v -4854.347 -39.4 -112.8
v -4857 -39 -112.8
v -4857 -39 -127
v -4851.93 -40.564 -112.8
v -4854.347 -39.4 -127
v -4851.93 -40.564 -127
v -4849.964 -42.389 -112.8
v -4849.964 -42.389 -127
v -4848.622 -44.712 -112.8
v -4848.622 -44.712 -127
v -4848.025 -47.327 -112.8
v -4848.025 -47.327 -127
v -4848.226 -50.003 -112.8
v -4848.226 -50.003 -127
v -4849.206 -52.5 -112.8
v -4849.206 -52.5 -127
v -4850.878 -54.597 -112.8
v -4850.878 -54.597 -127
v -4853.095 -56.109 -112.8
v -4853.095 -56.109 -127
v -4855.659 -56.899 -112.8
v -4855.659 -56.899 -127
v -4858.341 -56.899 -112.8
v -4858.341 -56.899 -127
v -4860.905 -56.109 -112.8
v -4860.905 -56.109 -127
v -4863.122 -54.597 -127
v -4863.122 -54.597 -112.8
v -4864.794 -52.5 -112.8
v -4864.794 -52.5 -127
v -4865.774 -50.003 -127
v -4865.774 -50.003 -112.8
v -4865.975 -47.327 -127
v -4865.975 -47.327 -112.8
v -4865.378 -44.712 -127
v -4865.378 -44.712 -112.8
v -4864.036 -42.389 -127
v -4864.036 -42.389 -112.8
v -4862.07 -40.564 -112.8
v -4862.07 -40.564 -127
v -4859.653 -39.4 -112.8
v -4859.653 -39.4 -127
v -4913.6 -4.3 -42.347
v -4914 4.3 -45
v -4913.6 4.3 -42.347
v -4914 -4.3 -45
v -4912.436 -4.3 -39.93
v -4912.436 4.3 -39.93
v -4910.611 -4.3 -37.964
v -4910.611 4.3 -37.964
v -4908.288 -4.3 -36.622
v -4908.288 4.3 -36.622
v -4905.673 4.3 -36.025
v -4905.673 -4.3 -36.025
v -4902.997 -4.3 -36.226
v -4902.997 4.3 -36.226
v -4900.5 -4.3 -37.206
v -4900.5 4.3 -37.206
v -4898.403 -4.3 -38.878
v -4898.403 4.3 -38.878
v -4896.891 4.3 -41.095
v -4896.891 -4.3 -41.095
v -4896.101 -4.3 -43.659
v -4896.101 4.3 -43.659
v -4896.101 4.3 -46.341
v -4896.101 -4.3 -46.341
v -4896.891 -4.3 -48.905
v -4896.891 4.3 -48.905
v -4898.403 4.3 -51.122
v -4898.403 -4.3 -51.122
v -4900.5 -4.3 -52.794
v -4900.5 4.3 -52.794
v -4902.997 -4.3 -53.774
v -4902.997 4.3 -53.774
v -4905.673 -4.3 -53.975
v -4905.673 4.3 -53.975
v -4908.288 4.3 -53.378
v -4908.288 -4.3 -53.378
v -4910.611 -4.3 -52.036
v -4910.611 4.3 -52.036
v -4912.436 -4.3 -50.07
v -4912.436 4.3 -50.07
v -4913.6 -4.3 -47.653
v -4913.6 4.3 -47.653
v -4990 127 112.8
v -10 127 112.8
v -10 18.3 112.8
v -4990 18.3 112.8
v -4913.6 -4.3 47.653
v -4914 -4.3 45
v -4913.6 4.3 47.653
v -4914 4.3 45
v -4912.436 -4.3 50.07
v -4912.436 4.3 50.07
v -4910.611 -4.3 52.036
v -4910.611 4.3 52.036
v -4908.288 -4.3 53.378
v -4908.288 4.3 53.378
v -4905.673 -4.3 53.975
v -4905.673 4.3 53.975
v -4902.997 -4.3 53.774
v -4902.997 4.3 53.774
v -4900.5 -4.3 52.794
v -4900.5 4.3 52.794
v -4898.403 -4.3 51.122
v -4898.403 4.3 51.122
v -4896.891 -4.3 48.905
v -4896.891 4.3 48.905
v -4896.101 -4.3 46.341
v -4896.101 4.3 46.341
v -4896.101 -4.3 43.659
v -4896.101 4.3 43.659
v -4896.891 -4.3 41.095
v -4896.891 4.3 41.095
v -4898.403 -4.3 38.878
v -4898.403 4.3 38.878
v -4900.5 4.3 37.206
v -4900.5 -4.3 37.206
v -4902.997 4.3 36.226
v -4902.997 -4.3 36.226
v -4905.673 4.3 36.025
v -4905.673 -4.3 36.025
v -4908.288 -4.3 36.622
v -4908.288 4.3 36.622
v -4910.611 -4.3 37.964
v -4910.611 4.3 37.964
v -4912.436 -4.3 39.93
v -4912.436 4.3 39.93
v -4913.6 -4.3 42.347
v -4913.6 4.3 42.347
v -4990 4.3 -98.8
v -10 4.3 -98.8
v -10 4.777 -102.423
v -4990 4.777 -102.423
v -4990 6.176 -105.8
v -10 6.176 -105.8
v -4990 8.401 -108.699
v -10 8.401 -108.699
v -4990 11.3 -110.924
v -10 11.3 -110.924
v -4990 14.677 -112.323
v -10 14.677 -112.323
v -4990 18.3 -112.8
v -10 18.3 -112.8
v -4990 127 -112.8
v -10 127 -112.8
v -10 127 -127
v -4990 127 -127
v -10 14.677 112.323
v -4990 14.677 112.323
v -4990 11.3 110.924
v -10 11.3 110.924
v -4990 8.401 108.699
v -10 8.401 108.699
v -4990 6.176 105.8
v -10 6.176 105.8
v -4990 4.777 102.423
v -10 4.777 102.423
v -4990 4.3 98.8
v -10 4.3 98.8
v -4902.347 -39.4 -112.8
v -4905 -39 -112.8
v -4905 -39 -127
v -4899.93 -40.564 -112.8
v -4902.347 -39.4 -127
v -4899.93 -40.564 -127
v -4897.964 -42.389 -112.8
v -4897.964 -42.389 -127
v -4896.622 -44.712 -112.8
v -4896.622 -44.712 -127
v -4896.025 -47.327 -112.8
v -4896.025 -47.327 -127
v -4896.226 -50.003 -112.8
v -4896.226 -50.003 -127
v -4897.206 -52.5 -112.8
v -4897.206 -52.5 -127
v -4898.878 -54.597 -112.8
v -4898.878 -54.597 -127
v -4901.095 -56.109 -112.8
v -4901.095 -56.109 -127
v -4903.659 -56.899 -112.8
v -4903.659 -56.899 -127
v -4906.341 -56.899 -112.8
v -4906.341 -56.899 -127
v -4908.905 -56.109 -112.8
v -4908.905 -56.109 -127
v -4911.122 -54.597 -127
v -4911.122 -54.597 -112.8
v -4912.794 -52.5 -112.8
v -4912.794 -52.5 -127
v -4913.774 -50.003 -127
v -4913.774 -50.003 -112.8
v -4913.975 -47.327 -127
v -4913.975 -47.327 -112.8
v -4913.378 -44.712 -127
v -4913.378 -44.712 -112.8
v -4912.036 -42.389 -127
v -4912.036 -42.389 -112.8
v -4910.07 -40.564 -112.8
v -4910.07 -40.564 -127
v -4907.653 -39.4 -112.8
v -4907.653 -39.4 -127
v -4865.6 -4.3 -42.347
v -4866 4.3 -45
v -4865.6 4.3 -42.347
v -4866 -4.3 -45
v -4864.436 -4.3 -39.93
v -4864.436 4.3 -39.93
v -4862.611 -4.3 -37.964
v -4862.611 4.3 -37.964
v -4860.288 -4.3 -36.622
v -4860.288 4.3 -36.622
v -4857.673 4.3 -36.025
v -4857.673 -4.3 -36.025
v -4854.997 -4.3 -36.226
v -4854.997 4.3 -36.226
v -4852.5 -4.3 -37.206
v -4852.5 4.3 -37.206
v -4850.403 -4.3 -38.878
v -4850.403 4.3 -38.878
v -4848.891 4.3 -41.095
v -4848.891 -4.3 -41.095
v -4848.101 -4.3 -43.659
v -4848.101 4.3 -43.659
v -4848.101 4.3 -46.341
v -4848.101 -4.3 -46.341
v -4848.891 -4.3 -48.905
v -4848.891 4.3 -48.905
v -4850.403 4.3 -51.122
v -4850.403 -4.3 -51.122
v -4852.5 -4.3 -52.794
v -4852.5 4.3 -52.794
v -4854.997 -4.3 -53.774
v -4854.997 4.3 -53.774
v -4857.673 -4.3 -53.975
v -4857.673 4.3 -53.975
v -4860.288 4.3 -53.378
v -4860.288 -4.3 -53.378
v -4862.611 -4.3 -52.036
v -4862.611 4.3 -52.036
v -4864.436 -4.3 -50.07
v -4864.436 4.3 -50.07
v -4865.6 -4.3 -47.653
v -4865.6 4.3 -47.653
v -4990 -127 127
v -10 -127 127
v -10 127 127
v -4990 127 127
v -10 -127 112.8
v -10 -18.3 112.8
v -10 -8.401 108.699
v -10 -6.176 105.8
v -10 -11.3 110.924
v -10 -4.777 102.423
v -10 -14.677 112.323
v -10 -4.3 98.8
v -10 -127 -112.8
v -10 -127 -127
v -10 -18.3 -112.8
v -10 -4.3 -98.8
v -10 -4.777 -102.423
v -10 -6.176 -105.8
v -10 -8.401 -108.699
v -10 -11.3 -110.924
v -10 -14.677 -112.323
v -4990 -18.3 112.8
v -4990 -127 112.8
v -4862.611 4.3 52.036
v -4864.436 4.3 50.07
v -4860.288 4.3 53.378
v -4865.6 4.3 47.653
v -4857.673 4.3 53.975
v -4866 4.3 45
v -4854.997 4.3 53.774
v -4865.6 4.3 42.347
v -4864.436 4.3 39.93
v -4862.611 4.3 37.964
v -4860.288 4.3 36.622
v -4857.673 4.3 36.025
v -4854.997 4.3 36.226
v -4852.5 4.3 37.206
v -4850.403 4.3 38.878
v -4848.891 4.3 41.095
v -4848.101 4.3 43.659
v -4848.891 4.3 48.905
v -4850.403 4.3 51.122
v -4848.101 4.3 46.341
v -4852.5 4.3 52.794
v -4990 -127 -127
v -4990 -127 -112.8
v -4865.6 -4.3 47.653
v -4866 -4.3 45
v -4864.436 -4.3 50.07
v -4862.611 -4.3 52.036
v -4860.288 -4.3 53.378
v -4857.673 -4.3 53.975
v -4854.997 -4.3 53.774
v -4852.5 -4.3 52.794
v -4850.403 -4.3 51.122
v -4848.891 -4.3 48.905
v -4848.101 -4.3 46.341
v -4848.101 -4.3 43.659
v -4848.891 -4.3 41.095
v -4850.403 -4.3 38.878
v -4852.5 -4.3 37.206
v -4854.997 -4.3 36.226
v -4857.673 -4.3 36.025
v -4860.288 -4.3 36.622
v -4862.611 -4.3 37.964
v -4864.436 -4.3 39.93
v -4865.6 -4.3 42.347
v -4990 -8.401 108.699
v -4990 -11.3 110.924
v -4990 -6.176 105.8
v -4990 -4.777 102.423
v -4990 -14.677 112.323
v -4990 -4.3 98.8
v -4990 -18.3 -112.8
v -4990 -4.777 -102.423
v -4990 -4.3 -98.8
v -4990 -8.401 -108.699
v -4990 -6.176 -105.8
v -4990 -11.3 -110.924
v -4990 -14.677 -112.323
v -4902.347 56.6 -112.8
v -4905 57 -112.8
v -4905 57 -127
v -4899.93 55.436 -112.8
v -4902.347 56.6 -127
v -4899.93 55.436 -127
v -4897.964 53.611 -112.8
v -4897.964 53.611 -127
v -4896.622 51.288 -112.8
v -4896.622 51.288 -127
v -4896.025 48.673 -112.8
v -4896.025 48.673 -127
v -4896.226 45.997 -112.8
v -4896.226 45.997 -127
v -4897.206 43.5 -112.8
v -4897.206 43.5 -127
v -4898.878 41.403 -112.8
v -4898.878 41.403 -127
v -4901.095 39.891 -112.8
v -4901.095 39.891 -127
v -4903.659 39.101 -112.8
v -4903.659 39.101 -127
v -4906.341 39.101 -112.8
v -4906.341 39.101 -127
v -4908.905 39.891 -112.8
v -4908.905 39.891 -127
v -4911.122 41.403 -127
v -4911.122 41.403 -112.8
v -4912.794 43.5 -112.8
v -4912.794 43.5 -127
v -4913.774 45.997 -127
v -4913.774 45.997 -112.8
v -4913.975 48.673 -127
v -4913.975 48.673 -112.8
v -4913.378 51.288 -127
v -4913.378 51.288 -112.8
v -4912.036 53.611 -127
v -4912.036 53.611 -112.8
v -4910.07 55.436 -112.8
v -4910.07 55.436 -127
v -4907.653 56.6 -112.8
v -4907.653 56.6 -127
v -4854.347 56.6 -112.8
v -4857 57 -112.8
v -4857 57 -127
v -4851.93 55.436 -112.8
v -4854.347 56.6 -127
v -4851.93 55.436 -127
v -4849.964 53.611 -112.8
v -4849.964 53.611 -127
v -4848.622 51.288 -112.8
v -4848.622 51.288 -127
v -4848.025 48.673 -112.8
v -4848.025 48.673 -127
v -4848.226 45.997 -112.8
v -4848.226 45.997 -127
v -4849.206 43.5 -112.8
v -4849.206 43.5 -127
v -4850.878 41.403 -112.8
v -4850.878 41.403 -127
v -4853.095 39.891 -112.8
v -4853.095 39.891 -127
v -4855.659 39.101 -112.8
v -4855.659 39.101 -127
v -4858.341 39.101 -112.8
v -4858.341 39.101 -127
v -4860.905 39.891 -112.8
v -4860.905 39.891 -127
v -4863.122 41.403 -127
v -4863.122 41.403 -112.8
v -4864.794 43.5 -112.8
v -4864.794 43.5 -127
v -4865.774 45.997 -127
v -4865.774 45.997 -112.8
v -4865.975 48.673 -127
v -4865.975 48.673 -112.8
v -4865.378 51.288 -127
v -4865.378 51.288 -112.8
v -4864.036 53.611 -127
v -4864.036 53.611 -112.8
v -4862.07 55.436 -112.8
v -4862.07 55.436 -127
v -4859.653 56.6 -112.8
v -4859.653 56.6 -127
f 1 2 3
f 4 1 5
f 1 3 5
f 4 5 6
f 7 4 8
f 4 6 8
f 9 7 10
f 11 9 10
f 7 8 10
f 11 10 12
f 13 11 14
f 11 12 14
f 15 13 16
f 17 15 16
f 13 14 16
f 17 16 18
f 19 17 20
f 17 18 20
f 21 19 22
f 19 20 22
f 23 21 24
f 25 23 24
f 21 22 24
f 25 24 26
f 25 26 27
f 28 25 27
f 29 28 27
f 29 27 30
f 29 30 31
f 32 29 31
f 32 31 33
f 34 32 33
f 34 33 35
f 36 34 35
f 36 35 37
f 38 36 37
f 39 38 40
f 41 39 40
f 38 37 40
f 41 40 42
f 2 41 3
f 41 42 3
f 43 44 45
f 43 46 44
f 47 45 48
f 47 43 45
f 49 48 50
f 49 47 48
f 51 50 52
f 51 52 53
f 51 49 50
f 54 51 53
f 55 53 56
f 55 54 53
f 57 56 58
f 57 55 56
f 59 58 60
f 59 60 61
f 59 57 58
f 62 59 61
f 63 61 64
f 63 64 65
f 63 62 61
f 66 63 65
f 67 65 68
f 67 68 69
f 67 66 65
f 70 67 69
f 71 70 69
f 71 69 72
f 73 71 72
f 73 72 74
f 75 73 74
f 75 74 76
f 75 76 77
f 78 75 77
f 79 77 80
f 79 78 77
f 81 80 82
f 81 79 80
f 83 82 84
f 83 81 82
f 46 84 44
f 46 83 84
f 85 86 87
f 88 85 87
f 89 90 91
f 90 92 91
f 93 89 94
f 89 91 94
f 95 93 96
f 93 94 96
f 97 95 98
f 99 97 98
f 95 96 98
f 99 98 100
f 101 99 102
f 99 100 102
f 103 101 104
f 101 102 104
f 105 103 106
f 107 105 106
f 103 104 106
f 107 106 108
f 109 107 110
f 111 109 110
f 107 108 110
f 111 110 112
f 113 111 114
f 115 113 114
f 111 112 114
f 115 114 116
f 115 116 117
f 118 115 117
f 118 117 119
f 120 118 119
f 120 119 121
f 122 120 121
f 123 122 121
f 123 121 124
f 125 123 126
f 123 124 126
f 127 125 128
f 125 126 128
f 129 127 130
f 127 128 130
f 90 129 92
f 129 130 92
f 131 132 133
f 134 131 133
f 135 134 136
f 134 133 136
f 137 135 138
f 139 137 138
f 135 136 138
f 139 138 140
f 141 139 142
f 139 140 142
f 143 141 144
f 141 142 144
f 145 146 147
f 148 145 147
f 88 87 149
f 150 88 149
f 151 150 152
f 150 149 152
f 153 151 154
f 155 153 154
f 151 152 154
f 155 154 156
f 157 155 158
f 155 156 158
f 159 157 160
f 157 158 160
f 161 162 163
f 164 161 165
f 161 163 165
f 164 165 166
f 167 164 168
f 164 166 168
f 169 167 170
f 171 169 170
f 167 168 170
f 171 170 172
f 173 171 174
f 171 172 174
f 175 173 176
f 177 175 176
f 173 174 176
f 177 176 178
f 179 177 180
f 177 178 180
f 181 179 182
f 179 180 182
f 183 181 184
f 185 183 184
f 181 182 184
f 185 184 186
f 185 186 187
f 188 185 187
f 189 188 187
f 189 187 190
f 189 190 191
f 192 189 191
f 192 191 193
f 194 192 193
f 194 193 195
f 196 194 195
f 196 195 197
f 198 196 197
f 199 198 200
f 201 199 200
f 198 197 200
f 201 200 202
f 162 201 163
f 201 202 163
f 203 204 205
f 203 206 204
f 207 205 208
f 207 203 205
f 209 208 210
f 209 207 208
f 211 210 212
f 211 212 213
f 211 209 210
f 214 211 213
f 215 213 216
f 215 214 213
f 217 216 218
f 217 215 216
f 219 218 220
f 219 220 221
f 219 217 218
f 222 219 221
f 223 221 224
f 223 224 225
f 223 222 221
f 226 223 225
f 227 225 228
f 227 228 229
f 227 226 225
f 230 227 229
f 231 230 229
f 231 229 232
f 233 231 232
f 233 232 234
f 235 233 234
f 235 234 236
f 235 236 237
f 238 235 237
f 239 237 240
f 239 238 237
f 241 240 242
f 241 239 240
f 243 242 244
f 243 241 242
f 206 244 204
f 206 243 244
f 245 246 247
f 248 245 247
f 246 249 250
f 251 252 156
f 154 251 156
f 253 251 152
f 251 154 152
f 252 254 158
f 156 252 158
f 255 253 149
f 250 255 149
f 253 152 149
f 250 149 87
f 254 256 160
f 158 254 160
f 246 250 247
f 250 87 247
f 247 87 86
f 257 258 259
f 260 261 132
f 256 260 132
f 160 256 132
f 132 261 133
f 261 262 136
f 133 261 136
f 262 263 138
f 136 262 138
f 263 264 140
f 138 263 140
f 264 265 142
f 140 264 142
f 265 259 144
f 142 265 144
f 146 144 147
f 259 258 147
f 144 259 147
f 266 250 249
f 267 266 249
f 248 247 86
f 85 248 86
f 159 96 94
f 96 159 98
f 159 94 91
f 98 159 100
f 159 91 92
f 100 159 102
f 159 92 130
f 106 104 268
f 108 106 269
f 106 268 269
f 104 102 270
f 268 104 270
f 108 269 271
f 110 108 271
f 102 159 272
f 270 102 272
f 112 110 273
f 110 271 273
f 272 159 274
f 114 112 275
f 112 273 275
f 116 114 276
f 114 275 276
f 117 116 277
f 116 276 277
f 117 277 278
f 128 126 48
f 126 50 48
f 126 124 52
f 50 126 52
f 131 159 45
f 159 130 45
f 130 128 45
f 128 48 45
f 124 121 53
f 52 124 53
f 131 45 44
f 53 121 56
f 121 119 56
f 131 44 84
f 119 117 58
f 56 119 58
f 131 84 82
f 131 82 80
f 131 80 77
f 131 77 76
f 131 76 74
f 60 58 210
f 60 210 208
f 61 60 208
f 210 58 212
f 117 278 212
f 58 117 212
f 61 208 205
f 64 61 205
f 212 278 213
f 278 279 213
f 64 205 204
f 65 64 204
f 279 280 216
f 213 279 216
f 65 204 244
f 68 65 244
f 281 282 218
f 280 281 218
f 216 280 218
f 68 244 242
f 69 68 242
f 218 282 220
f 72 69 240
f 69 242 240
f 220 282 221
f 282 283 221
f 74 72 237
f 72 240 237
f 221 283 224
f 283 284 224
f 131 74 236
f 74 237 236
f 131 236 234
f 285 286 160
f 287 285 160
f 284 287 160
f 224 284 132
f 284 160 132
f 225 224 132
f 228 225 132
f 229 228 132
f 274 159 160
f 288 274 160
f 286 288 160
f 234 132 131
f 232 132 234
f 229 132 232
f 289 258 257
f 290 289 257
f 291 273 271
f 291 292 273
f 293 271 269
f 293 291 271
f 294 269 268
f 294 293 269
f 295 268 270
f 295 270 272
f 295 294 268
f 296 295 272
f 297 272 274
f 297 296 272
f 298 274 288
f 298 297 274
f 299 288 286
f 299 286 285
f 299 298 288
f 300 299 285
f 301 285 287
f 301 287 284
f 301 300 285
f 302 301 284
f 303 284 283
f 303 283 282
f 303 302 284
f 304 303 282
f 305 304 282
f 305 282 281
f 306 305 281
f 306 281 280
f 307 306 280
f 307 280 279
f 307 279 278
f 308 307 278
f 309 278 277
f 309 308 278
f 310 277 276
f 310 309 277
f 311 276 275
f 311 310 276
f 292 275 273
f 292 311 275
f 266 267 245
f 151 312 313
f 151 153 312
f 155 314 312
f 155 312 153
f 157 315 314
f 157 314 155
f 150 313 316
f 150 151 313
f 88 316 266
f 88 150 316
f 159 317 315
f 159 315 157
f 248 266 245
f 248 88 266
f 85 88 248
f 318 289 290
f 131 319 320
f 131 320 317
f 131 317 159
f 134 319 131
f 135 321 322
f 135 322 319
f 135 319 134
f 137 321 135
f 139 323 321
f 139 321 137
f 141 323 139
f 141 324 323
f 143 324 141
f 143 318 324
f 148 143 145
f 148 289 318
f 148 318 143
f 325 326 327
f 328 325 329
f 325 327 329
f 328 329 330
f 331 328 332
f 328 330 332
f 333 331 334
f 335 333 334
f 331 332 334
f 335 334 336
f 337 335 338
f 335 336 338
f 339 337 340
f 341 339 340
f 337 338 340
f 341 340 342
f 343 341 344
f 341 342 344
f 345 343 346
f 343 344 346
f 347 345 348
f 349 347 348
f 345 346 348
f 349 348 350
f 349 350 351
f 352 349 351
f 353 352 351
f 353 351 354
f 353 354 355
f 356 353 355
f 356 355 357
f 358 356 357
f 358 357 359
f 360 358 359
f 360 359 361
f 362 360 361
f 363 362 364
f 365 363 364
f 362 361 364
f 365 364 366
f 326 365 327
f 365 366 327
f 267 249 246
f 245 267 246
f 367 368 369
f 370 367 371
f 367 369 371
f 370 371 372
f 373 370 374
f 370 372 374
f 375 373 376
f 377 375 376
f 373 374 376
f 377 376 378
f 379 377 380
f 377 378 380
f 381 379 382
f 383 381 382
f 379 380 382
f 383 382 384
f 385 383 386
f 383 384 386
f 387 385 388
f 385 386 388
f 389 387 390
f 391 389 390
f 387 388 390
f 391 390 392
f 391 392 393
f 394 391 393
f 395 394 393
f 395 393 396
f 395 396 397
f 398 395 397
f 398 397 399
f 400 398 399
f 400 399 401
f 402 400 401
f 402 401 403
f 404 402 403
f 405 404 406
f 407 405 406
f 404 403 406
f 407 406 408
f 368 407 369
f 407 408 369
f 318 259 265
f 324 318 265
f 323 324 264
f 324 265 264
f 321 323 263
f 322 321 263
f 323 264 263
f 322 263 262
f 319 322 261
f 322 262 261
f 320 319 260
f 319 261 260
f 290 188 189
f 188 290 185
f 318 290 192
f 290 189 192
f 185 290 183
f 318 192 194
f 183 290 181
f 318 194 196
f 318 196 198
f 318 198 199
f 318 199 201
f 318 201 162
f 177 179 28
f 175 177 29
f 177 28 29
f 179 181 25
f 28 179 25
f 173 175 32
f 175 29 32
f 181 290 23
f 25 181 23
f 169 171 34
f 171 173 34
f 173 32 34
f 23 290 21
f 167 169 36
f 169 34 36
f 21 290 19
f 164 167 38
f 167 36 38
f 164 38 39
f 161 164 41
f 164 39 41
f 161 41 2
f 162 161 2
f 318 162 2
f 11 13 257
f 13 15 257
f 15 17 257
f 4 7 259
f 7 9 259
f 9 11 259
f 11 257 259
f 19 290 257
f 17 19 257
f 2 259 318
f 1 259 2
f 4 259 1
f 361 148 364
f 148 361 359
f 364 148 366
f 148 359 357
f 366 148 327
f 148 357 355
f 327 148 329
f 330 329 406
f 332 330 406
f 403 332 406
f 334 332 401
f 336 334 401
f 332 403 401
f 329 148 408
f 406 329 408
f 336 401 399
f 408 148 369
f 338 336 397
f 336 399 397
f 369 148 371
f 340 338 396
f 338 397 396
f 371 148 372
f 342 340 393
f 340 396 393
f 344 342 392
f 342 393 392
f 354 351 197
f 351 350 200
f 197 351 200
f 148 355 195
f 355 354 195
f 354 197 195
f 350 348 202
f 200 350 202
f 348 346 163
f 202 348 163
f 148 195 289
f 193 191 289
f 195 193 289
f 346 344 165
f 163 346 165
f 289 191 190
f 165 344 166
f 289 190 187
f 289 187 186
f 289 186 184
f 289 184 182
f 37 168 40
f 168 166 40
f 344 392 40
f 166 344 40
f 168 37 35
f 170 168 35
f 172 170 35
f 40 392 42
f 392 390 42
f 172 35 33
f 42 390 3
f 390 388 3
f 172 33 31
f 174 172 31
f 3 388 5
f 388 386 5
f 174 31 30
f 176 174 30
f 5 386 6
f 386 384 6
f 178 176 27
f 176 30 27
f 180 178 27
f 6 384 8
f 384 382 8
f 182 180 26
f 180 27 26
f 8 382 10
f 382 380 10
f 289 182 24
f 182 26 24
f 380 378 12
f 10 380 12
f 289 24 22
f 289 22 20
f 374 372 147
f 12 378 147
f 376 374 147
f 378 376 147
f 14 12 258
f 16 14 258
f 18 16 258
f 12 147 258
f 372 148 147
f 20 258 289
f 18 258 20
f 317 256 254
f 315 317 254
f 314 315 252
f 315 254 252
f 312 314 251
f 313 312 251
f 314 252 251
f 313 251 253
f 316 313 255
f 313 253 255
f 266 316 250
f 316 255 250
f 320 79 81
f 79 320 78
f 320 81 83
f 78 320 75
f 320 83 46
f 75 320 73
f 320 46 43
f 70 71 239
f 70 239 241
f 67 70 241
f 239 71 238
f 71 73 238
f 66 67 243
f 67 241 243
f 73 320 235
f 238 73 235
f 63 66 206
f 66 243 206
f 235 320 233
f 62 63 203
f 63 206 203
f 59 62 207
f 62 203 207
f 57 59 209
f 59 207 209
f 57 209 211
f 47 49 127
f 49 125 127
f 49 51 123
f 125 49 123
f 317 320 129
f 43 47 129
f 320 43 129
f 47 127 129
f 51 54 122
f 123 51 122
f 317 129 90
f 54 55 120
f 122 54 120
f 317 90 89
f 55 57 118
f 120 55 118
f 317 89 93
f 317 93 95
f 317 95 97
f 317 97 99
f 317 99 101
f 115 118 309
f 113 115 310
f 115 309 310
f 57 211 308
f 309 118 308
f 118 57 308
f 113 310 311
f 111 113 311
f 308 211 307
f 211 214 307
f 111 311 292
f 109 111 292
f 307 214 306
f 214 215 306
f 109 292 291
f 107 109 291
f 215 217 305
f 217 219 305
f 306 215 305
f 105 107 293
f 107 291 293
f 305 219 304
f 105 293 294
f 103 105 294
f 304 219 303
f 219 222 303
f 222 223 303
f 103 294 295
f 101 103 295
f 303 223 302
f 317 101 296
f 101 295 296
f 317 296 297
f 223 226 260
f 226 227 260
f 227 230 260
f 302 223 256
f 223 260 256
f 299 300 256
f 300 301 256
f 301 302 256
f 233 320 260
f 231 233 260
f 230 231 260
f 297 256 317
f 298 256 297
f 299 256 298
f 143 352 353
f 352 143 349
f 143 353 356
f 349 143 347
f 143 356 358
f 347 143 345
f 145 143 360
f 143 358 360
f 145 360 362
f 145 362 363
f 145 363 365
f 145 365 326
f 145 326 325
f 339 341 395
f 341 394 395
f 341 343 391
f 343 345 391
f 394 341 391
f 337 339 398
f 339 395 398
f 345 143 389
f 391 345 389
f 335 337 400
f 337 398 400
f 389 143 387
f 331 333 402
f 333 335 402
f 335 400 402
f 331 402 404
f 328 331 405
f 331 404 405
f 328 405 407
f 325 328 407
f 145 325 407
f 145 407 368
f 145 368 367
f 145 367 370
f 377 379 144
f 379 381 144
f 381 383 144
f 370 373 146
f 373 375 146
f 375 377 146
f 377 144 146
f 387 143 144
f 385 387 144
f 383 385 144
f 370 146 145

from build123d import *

# Parameters (mm, degrees)
UNIVERSAL_COLUMN_ICS_250UC72_9_1_DEPTH = 5000
SKETCH3_R                              = 9
CUT_EXTRUDE2_DEPTH                     = 14.2
SKETCH20_R                             = 9
CUT_EXTRUDE19_DEPTH                    = 4.3
SKETCH21_W                             = 254
SKETCH21_H                             = 254
CUT_EXTRUDE20_DEPTH                    = 10
SKETCH22_W                             = 282
SKETCH22_H                             = 282
CUT_EXTRUDE21_DEPTH                    = 10


with BuildPart() as part:
    # Sketch1 → Universal Column_ics 250UC72.9(1) (new body)
    with BuildSketch(Plane(origin=(0, 0, 0), x_dir=(0, 1, 0), z_dir=(-1, 0, 0))):
        with BuildLine():
            Line((-127, -127), (127, -127))
            Line((127, -127), (127, -112.8))
            Line((127, -112.8), (18.3, -112.8))
            ThreePointArc((18.3, -112.8), (8.400505063, -108.699494937), (4.3, -98.8))
            Line((4.3, -98.8), (4.3, 98.8))
            ThreePointArc((4.3, 98.8), (8.400505063, 108.699494937), (18.3, 112.8))
            Line((18.3, 112.8), (127, 112.8))
            Line((127, 112.8), (127, 127))
            Line((127, 127), (-127, 127))
            Line((-127, 127), (-127, 112.8))
            Line((-127, 112.8), (-18.3, 112.8))
            ThreePointArc((-18.3, 112.8), (-8.400505063, 108.699494937), (-4.3, 98.8))
            Line((-4.3, 98.8), (-4.3, -98.8))
            ThreePointArc((-4.3, -98.8), (-8.400505063, -108.699494937), (-18.3, -112.8))
            Line((-18.3, -112.8), (-127, -112.8))
            Line((-127, -112.8), (-127, -127))
        make_face()
    extrude(amount=UNIVERSAL_COLUMN_ICS_250UC72_9_1_DEPTH)

    # Sketch3 → Cut-Extrude2 (cut)
    with BuildSketch(Plane(origin=(-4890.5, 0, -127), x_dir=(0, -1, 0), z_dir=(0, 0, -1))):
        with Locations(Location((48, -33.5, 0), (0, 0, 180))):
            Circle(SKETCH3_R)
        with Locations(Location((48, 14.5, 0), (0, 0, 180))):
            Circle(SKETCH3_R)
        with Locations(Location((-48, -33.5, 0), (0, 0, 180))):
            Circle(SKETCH3_R)
        with Locations(Location((-48, 14.5, 0), (0, 0, 180))):
            Circle(SKETCH3_R)
    extrude(amount=-CUT_EXTRUDE2_DEPTH, mode=Mode.SUBTRACT)

    # Sketch20 → Cut-Extrude19 (cut, symmetric)
    with BuildSketch(Plane(origin=(-4890.5, 0, 0), x_dir=(0, 0, -1), z_dir=(0, 1, 0))):
        with Locations(Location((45, -33.5, 0), (0, 0, 90))):
            Circle(SKETCH20_R)
        with Locations(Location((-45, -33.5, 0), (0, 0, 90))):
            Circle(SKETCH20_R)
        with Locations(Location((45, 14.5, 0), (0, 0, 90))):
            Circle(SKETCH20_R)
        with Locations(Location((-45, 14.5, 0), (0, 0, 90))):
            Circle(SKETCH20_R)
    extrude(amount=CUT_EXTRUDE19_DEPTH, both=True, mode=Mode.SUBTRACT)

    # Sketch21 → Cut-Extrude20 (cut)
    with BuildSketch(Plane(origin=(-5000, 0, 0), x_dir=(0, 1, 0), z_dir=(-1, 0, 0))):
        Rectangle(SKETCH21_W, SKETCH21_H)
    extrude(amount=-CUT_EXTRUDE20_DEPTH, mode=Mode.SUBTRACT)

    # Sketch22 → Cut-Extrude21 (cut)
    with BuildSketch(Plane(origin=(0, 0, 0), x_dir=(0, 1, 0), z_dir=(-1, 0, 0))):
        Rectangle(SKETCH22_W, SKETCH22_H)
    extrude(amount=CUT_EXTRUDE21_DEPTH, mode=Mode.SUBTRACT)


solid = part.part
